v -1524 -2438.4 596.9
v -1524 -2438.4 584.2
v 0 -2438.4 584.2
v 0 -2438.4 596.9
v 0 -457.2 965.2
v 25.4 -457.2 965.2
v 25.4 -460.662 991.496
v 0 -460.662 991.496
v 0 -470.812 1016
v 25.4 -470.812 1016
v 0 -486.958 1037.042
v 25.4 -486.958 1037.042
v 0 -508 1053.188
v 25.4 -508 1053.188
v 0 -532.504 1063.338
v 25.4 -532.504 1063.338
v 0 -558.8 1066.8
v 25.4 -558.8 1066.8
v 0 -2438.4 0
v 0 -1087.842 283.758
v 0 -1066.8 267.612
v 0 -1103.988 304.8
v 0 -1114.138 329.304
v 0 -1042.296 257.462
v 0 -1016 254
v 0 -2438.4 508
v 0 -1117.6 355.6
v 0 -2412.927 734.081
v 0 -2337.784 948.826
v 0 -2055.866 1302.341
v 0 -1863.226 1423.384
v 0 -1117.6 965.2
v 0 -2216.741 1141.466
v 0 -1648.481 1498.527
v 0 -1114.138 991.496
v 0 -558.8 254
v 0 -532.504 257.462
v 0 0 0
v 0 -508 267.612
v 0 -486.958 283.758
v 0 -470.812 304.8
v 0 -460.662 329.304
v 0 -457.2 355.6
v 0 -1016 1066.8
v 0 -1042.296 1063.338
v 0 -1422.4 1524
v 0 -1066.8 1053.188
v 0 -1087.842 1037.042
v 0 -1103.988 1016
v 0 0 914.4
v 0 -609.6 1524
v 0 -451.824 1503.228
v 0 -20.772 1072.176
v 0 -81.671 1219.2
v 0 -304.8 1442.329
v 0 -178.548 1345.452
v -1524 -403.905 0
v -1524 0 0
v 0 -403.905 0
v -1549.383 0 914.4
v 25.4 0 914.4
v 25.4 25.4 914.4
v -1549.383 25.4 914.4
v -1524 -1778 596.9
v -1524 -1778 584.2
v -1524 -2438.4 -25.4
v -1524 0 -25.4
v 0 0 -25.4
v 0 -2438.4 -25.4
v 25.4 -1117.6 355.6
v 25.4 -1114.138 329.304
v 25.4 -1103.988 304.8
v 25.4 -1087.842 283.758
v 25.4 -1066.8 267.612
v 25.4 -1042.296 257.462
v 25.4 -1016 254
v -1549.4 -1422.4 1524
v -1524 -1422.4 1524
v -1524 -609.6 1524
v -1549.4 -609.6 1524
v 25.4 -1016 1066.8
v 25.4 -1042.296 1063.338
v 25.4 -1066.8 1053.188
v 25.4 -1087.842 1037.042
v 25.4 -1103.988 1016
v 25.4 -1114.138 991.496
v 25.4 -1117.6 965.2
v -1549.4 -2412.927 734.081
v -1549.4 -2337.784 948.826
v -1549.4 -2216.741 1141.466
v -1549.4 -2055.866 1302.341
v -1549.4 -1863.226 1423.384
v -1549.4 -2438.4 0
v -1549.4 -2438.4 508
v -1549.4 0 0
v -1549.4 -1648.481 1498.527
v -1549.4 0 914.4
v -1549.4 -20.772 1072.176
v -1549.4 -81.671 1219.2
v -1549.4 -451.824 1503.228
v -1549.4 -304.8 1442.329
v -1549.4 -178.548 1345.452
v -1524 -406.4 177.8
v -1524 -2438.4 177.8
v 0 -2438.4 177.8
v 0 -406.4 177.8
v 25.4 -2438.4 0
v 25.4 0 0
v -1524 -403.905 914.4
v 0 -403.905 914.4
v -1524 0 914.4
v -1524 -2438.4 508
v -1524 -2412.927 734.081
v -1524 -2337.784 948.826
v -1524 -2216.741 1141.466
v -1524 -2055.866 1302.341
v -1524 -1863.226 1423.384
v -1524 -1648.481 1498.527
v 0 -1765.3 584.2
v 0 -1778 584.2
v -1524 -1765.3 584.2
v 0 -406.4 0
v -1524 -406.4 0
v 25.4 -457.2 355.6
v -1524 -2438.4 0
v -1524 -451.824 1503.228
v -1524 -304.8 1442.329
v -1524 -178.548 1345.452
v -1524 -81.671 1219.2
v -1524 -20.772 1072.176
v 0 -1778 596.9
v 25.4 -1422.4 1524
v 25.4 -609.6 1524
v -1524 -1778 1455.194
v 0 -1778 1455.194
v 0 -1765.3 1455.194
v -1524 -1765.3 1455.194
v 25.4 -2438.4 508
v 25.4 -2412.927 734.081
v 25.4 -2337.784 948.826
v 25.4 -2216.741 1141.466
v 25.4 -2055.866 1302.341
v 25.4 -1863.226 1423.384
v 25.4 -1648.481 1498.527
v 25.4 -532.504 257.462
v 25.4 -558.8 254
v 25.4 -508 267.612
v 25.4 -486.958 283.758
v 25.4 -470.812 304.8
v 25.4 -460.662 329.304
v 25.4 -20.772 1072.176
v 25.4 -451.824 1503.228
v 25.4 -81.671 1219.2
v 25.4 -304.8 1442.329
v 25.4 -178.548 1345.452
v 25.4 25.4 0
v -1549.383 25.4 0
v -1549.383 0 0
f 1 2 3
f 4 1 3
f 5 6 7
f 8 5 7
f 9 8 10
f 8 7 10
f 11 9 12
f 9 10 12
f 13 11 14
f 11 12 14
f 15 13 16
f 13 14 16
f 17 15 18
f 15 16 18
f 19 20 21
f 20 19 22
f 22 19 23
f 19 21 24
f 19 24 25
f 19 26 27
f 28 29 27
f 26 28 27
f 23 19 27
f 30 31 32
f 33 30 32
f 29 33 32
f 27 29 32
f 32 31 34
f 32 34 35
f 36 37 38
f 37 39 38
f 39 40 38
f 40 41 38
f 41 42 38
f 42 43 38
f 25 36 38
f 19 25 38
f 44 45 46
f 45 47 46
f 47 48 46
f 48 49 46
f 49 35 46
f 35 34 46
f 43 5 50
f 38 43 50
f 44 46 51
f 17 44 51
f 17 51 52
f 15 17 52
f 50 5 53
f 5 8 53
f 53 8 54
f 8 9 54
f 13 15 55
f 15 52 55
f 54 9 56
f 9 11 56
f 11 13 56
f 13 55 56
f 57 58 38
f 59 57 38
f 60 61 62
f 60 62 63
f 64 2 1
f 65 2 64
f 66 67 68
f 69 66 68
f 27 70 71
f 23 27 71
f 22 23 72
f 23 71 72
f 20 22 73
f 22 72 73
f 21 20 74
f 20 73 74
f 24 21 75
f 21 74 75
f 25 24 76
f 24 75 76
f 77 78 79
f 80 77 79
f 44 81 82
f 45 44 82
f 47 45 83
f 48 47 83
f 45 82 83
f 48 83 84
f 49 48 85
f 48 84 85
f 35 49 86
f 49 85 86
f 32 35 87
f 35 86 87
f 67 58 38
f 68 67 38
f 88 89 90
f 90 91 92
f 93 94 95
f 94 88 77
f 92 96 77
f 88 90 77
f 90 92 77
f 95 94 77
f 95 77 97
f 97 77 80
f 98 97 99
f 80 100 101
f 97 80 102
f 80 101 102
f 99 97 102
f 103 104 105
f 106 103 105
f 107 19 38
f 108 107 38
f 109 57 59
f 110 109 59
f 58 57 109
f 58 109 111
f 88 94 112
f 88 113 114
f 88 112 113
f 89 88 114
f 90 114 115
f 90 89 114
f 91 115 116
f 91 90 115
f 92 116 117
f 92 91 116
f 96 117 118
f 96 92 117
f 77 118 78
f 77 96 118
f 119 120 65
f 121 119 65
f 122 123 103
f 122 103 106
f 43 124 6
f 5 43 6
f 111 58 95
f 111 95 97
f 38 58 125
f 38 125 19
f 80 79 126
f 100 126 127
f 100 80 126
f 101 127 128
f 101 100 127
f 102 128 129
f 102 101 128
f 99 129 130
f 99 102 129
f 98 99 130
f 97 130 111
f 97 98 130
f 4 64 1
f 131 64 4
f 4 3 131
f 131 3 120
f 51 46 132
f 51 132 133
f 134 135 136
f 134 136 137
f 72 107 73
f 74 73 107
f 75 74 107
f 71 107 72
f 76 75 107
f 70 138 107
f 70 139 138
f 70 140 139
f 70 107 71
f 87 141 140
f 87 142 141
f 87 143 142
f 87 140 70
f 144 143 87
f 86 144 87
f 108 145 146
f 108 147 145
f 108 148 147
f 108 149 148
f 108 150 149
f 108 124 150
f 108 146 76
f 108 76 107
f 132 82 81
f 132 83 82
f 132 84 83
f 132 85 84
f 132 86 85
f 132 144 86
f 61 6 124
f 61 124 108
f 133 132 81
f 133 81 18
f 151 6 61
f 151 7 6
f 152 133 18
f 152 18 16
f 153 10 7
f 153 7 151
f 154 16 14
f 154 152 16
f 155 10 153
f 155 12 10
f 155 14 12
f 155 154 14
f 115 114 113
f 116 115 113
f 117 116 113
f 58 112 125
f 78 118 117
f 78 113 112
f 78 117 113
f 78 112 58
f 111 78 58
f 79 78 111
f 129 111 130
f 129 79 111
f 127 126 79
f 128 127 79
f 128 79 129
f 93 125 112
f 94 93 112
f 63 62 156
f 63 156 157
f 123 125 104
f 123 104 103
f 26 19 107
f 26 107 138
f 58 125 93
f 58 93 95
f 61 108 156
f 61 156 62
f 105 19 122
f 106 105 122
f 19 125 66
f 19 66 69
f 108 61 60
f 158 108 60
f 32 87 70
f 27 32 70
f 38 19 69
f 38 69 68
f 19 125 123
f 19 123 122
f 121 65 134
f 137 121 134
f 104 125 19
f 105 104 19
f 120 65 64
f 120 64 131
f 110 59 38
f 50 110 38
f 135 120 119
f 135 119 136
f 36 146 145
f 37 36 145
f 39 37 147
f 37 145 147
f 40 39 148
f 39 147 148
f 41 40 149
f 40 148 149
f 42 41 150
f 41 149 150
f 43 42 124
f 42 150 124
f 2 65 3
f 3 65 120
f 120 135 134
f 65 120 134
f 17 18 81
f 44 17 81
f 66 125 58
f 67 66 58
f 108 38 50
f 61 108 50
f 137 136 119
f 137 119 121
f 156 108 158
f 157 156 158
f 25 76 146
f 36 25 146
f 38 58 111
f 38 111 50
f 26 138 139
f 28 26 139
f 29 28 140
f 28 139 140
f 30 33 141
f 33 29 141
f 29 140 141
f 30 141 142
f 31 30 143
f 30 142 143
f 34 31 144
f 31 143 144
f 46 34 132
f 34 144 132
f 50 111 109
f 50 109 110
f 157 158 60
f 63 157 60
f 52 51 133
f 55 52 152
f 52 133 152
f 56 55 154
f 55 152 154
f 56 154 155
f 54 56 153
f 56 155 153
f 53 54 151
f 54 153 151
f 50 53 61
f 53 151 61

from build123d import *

# Parameters (mm, degrees)
F0_W      = 2438.4
F0_H      = 1524
F1_DEPTH  = 25.4
F3_DEPTH  = 25.401
F4_W      = 1524
F4_H      = 2438.4
F5_DEPTH  = 25.4
F8_W      = 1574.782686615
F8_H      = 914.4
F9_DEPTH  = 25.4
F11_DEPTH = 1574.8
F12_W     = 1524
F12_H     = 2032
F13_DEPTH = 177.8
F15_W     = 1524
F15_H     = 660.4
F16_DEPTH = 12.7
F17_W     = 1524
F17_H     = 870.994234848
F18_DEPTH = 12.7
F19_W     = 1524
F19_H     = 403.904914856
F20_DEPTH = 914.4


with BuildPart() as f1:
    # F0 (on Right) → F1 (new body)
    with BuildSketch(Plane.YZ):
        with Locations((-1219.2, 762)):
            Rectangle(F0_W, F0_H)
    extrude(amount=F1_DEPTH)

    # F2 (on face) → F3 (cut, through all)
    with BuildSketch(Plane.YZ.offset(25.4)):
        with BuildLine():
            ThreePointArc((-2438.4, 508), (-2140.8204896855, 1226.4204896855), (-1422.4, 1524))
            Line((-1422.4, 1524), (-2438.4, 1524))
            Line((-2438.4, 1524), (-2438.4, 508))
        make_face()
        with BuildLine():
            ThreePointArc((-609.6, 1524), (-178.5477061887, 1345.4522938113), (0, 914.4))
            Line((0, 914.4), (0, 1524))
            Line((0, 1524), (-609.6, 1524))
        make_face()
    extrude(amount=-F3_DEPTH, mode=Mode.SUBTRACT)


with BuildPart() as f5:
    # F4 (on Top) → F5 (new body)
    with BuildSketch(Plane.XY):
        with Locations((-762, -1219.2)):
            Rectangle(F4_W, F4_H)
    extrude(amount=-F5_DEPTH)


with BuildPart() as f7_1:
    # F7: instance of F1
    add(f1.part.mirror(Plane.YZ.offset(-762)))


with BuildPart() as f9:
    # F8 (on face) → F9 (new body)
    with BuildSketch(Plane(origin=(0, 0, 0), x_dir=(-1, 0, 0), z_dir=(0, 1, 0))):
        with Locations((761.9913433075, 457.2)):
            Rectangle(F8_W, F8_H)
    extrude(amount=F9_DEPTH)


with BuildPart() as f1_1:
    add(f1.part)

    # F10 (on face) → F11 (cut)
    with BuildSketch(Plane.YZ.offset(25.4)):
        with BuildLine():
            Line((-558.8, 1066.8), (-1016, 1066.8))
            ThreePointArc((-1016, 1066.8), (-1087.8420489686, 1037.0420489686), (-1117.6, 965.2))
            Line((-1117.6, 965.2), (-1117.6, 355.6))
            ThreePointArc((-1117.6, 355.6), (-1087.8420489686, 283.7579510314), (-1016, 254))
            Line((-1016, 254), (-558.8, 254))
            ThreePointArc((-558.8, 254), (-486.9579510314, 283.7579510314), (-457.2, 355.6))
            Line((-457.2, 355.6), (-457.2, 965.2))
            ThreePointArc((-457.2, 965.2), (-486.9579510314, 1037.0420489686), (-558.8, 1066.8))
        make_face()
    extrude(amount=-F11_DEPTH, mode=Mode.SUBTRACT)


with BuildPart() as f13:
    # F12 (on face) → F13 (new body)
    with BuildSketch(Plane.XY):
        with Locations((-762, -1422.4)):
            Rectangle(F12_W, F12_H)
    extrude(amount=F13_DEPTH)


with BuildPart() as f16:
    # F15 (on offset) → F16 (new body)
    with BuildSketch(Plane.XY.offset(584.2)):
        with Locations((-762, -2108.2)):
            Rectangle(F15_W, F15_H)
    extrude(amount=F16_DEPTH)


with BuildPart() as f18:
    # F17 (on face) → F18 (new body)
    with BuildSketch(Plane(origin=(0, -1778, 0), x_dir=(-1, 0, 0), z_dir=(0, 1, 0))):
        with Locations((762, 1019.697117424)):
            Rectangle(F17_W, F17_H)
    extrude(amount=F18_DEPTH)


with BuildPart() as f20:
    # F19 (on face) → F20 (new body)
    with BuildSketch(Plane.XY):
        with Locations((-762, -201.952457428)):
            Rectangle(F19_W, F19_H)
    extrude(amount=F20_DEPTH)


solid = Compound([f5.part, f7_1.part, f9.part, f1_1.part, f13.part, f16.part, f18.part, f20.part])
